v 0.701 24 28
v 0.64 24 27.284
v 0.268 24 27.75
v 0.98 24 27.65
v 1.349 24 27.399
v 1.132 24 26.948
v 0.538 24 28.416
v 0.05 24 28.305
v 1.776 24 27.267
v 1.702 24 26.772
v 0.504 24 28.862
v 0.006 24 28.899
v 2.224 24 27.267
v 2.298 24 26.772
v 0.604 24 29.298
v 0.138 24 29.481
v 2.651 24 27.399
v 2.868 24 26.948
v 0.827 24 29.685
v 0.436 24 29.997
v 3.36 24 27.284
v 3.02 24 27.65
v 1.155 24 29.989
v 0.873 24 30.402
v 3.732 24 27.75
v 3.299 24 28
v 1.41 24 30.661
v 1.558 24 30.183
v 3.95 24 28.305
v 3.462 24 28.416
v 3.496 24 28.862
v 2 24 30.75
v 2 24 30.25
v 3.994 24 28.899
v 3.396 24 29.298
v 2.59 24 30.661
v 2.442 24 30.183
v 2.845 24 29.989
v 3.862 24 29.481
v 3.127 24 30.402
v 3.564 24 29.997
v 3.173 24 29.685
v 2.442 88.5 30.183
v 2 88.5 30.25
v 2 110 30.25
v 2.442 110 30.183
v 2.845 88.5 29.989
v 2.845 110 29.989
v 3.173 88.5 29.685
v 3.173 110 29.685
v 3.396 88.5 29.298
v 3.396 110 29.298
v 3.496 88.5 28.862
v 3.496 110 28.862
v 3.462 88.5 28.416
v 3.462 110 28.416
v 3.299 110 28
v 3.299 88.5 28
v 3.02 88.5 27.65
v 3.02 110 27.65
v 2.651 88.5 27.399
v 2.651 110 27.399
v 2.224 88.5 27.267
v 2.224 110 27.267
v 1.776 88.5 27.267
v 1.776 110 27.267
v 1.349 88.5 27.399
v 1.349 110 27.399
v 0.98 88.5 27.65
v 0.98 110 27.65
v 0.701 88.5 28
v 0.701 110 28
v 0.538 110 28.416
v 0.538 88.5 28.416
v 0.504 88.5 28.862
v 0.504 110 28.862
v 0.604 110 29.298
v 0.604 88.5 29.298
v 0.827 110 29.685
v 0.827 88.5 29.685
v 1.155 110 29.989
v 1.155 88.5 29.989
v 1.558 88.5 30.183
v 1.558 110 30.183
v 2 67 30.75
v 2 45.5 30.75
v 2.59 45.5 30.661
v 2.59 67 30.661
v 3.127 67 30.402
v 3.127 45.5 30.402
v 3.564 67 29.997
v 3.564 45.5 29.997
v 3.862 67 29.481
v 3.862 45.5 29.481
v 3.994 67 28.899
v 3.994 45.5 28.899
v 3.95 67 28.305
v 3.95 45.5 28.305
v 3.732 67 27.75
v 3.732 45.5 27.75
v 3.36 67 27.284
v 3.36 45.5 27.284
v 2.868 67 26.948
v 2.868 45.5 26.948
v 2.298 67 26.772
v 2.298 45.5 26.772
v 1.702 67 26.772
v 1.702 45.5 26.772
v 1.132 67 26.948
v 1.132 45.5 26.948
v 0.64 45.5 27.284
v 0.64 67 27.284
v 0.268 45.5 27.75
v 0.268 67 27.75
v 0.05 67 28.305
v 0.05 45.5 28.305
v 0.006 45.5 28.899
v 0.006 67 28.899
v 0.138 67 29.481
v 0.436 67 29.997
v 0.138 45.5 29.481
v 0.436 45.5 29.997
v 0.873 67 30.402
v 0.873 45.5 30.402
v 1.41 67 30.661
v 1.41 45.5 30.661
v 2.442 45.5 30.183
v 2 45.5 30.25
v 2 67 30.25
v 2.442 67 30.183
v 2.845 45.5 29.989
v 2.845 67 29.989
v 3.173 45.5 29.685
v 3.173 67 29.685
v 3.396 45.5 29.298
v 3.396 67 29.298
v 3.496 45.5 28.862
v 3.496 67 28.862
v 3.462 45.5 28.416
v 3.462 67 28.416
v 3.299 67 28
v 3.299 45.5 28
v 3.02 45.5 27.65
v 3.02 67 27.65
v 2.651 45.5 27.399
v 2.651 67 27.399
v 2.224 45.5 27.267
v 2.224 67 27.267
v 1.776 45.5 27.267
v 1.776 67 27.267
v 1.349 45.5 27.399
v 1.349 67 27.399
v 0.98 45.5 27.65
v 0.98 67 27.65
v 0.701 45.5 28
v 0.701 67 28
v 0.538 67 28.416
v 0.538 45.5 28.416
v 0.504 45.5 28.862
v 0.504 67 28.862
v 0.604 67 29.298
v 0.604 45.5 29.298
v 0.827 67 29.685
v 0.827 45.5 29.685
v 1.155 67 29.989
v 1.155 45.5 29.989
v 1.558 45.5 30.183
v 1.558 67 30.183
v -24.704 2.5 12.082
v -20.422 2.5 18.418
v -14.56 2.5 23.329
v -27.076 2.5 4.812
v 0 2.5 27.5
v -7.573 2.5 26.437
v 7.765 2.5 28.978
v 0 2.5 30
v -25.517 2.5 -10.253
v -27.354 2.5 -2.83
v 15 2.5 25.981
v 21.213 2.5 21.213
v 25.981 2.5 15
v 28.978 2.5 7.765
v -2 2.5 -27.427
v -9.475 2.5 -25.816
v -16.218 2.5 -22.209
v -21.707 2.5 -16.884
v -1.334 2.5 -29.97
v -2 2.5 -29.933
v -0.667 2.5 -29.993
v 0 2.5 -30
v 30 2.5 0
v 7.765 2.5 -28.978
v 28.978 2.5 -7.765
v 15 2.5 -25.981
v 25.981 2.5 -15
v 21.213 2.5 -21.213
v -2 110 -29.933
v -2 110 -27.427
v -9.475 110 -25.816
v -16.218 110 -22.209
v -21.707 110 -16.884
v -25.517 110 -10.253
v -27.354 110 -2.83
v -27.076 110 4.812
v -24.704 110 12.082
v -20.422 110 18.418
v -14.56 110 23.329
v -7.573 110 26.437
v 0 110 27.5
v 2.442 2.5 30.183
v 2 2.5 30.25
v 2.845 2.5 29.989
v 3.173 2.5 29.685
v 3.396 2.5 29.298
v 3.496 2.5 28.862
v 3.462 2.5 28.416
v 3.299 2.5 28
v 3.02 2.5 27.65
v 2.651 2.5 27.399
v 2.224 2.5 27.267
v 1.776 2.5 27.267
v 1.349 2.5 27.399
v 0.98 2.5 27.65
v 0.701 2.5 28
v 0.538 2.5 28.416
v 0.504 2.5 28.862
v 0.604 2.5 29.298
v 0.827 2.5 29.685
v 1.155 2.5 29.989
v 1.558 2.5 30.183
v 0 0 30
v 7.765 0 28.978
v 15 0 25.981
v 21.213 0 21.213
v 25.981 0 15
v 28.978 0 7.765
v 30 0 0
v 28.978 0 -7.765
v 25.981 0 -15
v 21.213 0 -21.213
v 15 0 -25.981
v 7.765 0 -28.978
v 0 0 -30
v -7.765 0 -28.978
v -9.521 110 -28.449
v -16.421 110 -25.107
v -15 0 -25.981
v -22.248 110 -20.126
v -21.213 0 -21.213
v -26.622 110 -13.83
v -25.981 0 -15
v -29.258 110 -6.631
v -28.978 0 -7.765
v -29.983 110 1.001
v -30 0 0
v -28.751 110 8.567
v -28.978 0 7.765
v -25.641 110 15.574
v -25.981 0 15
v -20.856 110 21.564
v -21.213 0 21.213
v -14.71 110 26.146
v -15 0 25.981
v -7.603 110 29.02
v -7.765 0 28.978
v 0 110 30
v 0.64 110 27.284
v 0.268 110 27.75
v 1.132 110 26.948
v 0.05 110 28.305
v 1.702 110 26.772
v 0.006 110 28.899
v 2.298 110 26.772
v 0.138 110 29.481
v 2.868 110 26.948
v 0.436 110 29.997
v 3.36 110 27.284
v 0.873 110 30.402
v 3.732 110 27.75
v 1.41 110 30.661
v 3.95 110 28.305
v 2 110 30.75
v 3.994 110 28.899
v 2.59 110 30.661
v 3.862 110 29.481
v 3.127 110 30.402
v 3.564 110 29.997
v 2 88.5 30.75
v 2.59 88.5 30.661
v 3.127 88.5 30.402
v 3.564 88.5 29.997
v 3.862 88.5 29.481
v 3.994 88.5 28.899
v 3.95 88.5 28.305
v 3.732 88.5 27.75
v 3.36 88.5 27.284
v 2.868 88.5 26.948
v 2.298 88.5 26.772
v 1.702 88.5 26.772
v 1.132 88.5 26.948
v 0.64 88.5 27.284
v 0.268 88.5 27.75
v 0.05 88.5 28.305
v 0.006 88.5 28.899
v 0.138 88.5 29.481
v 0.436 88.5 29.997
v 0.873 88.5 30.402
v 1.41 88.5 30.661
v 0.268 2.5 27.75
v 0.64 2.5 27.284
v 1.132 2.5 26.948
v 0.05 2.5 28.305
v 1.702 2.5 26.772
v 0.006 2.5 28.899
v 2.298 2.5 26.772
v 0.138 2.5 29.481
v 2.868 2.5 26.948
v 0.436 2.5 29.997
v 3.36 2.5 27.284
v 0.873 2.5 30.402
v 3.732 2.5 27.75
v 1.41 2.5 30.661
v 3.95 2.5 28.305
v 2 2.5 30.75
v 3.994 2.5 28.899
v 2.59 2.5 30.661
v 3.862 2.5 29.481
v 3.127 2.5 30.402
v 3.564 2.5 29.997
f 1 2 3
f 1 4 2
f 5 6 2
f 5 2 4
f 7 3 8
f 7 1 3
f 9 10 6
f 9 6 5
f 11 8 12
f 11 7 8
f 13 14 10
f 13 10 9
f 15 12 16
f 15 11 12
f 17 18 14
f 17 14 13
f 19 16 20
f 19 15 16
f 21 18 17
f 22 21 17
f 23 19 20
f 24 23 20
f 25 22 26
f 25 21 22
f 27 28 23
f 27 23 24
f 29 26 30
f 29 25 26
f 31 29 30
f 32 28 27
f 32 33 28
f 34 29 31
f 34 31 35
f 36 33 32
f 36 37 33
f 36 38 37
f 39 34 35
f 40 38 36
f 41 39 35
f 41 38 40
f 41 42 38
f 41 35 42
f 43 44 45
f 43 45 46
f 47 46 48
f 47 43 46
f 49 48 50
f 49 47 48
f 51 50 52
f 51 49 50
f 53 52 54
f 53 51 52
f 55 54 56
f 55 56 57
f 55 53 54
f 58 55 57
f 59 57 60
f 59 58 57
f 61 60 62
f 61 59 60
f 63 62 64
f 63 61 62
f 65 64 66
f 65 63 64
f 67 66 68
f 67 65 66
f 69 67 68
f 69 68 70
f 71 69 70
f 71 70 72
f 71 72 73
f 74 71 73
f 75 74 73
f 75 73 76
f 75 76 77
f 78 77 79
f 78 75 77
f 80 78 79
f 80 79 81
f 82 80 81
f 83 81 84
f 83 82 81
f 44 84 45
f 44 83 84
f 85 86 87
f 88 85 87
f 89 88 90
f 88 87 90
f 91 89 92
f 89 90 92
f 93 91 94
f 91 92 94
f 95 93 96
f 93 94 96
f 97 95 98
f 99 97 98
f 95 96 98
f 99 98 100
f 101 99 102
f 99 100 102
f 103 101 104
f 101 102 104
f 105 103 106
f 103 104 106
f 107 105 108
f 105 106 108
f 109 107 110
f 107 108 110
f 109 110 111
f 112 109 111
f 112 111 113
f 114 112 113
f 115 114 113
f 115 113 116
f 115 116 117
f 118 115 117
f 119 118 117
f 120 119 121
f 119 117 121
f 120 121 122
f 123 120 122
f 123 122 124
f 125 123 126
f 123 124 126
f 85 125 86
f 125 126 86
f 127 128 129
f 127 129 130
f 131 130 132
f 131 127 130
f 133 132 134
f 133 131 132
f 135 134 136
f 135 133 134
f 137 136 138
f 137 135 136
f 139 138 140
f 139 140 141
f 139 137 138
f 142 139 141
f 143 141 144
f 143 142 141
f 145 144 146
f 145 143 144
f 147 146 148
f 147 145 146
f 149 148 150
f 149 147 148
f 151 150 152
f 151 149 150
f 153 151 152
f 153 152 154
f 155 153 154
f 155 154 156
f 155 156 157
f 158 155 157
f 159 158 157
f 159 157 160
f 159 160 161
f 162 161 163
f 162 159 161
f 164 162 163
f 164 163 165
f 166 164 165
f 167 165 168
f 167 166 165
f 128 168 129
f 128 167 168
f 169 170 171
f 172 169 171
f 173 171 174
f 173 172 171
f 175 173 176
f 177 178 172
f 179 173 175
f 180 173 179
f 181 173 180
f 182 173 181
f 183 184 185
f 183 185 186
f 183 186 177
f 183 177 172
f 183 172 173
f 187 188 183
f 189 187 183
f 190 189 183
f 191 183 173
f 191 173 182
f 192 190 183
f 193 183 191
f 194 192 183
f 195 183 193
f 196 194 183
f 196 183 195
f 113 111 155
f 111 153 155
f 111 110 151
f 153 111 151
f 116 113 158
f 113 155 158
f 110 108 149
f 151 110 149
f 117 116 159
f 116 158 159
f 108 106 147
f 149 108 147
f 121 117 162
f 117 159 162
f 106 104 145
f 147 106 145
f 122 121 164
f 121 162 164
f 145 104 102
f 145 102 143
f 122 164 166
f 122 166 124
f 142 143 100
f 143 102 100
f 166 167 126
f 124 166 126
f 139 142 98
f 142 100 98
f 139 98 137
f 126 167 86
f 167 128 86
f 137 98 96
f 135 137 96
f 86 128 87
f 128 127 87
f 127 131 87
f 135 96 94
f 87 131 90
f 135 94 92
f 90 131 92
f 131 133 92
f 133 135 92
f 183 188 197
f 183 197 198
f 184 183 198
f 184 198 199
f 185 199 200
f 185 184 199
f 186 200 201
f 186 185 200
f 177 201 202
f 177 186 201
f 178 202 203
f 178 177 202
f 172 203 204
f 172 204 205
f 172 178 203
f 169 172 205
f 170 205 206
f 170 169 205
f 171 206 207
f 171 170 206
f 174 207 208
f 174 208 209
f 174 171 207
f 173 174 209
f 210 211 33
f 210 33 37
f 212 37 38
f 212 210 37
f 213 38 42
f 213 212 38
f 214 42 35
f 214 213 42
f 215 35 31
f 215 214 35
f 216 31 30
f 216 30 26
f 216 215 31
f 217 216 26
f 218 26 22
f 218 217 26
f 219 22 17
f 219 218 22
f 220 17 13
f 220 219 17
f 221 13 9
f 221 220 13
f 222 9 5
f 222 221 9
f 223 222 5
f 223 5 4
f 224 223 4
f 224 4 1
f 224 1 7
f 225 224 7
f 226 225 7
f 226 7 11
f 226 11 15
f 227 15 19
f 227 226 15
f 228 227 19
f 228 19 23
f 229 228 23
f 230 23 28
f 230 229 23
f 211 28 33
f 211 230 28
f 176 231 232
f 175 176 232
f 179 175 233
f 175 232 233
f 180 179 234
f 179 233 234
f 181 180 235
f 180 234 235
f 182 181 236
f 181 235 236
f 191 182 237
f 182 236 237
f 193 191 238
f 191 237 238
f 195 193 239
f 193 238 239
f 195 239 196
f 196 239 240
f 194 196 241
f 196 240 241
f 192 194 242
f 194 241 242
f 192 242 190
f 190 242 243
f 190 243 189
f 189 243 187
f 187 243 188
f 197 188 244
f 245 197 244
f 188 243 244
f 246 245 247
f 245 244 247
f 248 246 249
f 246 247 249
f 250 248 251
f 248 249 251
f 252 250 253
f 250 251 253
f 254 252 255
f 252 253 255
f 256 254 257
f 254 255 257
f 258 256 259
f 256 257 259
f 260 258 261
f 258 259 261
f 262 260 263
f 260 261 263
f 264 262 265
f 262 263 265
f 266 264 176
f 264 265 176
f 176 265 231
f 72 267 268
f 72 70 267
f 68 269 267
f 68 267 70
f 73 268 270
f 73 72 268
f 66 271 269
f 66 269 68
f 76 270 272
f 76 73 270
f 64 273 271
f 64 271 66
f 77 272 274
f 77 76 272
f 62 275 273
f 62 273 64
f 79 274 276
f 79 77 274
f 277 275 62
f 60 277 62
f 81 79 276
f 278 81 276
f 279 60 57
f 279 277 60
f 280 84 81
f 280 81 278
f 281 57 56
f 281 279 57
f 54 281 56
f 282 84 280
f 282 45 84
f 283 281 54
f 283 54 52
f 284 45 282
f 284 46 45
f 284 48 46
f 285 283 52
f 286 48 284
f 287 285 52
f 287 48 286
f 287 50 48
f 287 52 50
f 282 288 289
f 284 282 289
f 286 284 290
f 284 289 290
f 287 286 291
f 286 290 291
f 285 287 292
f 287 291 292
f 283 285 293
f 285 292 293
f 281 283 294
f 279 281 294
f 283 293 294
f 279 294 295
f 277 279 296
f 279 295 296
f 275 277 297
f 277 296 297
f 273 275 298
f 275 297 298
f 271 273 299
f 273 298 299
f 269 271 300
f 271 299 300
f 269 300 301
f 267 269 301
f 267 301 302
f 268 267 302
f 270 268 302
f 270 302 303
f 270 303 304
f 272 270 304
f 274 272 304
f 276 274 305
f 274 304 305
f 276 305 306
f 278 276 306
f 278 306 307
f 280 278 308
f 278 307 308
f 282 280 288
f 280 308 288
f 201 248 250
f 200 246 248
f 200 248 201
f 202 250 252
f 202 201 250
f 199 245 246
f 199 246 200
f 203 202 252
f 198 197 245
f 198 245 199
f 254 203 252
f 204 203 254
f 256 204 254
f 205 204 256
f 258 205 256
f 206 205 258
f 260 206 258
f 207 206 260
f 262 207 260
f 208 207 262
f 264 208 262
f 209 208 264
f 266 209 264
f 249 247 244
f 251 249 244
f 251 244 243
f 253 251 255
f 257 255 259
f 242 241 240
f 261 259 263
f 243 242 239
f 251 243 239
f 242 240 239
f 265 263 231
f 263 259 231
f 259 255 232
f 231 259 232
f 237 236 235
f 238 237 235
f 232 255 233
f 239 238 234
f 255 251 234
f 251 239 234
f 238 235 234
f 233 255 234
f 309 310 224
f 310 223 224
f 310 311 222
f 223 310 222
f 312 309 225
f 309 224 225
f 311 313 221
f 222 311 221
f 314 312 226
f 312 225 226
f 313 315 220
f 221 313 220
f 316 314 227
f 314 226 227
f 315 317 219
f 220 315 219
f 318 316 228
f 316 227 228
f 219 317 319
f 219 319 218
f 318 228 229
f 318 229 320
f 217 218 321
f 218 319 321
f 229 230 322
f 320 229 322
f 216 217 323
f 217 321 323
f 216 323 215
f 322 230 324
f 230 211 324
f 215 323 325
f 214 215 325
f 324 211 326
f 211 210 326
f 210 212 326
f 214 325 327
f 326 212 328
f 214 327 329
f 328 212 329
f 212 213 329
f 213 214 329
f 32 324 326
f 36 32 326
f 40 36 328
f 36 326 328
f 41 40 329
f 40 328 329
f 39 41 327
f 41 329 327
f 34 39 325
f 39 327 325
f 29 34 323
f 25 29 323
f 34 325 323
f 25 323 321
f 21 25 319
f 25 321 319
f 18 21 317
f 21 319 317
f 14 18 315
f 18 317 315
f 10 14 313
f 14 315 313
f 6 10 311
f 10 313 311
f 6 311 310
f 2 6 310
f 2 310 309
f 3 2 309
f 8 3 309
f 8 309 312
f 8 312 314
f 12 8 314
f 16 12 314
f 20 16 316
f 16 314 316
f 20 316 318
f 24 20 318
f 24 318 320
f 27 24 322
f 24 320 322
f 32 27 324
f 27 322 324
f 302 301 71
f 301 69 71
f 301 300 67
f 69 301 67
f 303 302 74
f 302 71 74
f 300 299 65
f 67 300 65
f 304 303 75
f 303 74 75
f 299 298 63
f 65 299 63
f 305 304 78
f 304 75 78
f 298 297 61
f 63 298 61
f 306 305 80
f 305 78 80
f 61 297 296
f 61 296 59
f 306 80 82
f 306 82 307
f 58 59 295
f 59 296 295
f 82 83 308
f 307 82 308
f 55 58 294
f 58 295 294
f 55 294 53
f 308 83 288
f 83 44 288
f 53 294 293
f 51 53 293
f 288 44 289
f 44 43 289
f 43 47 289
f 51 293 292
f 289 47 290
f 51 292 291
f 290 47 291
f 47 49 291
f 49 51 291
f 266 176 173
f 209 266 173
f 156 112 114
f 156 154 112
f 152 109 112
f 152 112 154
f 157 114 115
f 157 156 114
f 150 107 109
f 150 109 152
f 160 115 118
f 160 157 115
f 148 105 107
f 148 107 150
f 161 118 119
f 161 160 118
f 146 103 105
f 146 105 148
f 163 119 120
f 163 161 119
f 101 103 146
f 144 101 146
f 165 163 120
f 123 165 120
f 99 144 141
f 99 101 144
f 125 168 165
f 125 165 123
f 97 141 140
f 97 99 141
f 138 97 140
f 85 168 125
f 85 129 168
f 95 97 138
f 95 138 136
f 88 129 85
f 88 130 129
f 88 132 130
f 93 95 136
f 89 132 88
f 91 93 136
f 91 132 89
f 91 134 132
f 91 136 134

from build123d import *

# Parameters (mm, degrees)
SKETCH1_R           = 30
BOSS_EXTRUDE1_DEPTH = 2.5
SKETCH2_R           = 30
SKETCH2_R_2         = 27.5
BOSS_EXTRUDE2_DEPTH = 107.5
CUT_EXTRUDE1_START  = -107.5
CUT_EXTRUDE1_DEPTH  = 107.5
SKETCH6_R           = 2
SKETCH6_R_2         = 1.5
BOSS_EXTRUDE9_DEPTH = 21.5
LPATTERN1_COUNT     = 3
LPATTERN1_PITCH     = 43
CUT_EXTRUDE2_START  = -107.5
CUT_EXTRUDE2_DEPTH  = 107.5


# Read off the part's stored shape, not the designer's step: Cut-Extrude2
with BuildPart() as part:
    # Sketch1 → Boss-Extrude1 (new body)
    with BuildSketch(Plane(origin=(0, 0, 0), x_dir=(1, 0, 0), z_dir=(0, 1, 0))):
        with Locations(Location((0, 0, 0), (0, 0, 270))):
            Circle(SKETCH1_R)
    extrude(amount=BOSS_EXTRUDE1_DEPTH)

    # Sketch2 → Boss-Extrude2 (add)
    with BuildSketch(Plane(origin=(0, 2.5, 0), x_dir=(1, 0, 0), z_dir=(0, 1, 0))):
        with Locations(Location((0, 0, 0), (0, 0, 270))):
            Circle(SKETCH2_R)
        with Locations(Location((0, 0, 0), (0, 0, 270))):
            Circle(SKETCH2_R_2, mode=Mode.SUBTRACT)
    extrude(amount=BOSS_EXTRUDE2_DEPTH)

    # Sketch3 → Cut-Extrude1 (cut)
    with BuildSketch(Plane(origin=(0, 110, 0), x_dir=(1, 0, 0), z_dir=(0, 1, 0)).offset(CUT_EXTRUDE1_START)):
        with BuildLine():
            Line((0, -30), (0, 30))
            ThreePointArc((0, 30), (30, 0), (0, -30))
        make_face()
    extrude(amount=CUT_EXTRUDE1_DEPTH, mode=Mode.SUBTRACT)

    # Cut-Extrude2 outline → Cut-Extrude2 (cut)
    with BuildSketch(Plane(origin=(0, 110, 0), x_dir=(1, 0, 0), z_dir=(0, 1, 0)).offset(CUT_EXTRUDE2_START)):
        with BuildLine():
            ThreePointArc((0, 30), (-1.000556639, 29.983310131), (-2, 29.933259094))
            Line((-2, 29.933259094), (-2, 27.427176304))
            ThreePointArc((-2, 27.427176304), (-1.000662692, 27.481788045), (0, 27.5))
            Line((0, 27.5), (0, 30))
        make_face()
    extrude(amount=CUT_EXTRUDE2_DEPTH, mode=Mode.SUBTRACT)


with BuildPart() as body_2:
    # Sketch6 → Boss-Extrude9 (new body)
    with BuildSketch(Plane(origin=(0, 2.5, 0), x_dir=(1, 0, 0), z_dir=(0, 1, 0))):
        with Locations(Location((2, -28.75, 0), (0, 0, 270))):
            Circle(SKETCH6_R)
        with Locations(Location((2, -28.75, 0), (0, 0, 270))):
            Circle(SKETCH6_R_2, mode=Mode.SUBTRACT)
    boss_extrude9 = extrude(amount=BOSS_EXTRUDE9_DEPTH)


with BuildPart() as lpattern1_1:
    # LPattern1: Boss-Extrude9 ×3
    with Locations(*[(0, i * LPATTERN1_PITCH, 0) for i in range(1, LPATTERN1_COUNT)]):
        add(boss_extrude9)


solid = Compound([part.part, body_2.part, lpattern1_1.part])
